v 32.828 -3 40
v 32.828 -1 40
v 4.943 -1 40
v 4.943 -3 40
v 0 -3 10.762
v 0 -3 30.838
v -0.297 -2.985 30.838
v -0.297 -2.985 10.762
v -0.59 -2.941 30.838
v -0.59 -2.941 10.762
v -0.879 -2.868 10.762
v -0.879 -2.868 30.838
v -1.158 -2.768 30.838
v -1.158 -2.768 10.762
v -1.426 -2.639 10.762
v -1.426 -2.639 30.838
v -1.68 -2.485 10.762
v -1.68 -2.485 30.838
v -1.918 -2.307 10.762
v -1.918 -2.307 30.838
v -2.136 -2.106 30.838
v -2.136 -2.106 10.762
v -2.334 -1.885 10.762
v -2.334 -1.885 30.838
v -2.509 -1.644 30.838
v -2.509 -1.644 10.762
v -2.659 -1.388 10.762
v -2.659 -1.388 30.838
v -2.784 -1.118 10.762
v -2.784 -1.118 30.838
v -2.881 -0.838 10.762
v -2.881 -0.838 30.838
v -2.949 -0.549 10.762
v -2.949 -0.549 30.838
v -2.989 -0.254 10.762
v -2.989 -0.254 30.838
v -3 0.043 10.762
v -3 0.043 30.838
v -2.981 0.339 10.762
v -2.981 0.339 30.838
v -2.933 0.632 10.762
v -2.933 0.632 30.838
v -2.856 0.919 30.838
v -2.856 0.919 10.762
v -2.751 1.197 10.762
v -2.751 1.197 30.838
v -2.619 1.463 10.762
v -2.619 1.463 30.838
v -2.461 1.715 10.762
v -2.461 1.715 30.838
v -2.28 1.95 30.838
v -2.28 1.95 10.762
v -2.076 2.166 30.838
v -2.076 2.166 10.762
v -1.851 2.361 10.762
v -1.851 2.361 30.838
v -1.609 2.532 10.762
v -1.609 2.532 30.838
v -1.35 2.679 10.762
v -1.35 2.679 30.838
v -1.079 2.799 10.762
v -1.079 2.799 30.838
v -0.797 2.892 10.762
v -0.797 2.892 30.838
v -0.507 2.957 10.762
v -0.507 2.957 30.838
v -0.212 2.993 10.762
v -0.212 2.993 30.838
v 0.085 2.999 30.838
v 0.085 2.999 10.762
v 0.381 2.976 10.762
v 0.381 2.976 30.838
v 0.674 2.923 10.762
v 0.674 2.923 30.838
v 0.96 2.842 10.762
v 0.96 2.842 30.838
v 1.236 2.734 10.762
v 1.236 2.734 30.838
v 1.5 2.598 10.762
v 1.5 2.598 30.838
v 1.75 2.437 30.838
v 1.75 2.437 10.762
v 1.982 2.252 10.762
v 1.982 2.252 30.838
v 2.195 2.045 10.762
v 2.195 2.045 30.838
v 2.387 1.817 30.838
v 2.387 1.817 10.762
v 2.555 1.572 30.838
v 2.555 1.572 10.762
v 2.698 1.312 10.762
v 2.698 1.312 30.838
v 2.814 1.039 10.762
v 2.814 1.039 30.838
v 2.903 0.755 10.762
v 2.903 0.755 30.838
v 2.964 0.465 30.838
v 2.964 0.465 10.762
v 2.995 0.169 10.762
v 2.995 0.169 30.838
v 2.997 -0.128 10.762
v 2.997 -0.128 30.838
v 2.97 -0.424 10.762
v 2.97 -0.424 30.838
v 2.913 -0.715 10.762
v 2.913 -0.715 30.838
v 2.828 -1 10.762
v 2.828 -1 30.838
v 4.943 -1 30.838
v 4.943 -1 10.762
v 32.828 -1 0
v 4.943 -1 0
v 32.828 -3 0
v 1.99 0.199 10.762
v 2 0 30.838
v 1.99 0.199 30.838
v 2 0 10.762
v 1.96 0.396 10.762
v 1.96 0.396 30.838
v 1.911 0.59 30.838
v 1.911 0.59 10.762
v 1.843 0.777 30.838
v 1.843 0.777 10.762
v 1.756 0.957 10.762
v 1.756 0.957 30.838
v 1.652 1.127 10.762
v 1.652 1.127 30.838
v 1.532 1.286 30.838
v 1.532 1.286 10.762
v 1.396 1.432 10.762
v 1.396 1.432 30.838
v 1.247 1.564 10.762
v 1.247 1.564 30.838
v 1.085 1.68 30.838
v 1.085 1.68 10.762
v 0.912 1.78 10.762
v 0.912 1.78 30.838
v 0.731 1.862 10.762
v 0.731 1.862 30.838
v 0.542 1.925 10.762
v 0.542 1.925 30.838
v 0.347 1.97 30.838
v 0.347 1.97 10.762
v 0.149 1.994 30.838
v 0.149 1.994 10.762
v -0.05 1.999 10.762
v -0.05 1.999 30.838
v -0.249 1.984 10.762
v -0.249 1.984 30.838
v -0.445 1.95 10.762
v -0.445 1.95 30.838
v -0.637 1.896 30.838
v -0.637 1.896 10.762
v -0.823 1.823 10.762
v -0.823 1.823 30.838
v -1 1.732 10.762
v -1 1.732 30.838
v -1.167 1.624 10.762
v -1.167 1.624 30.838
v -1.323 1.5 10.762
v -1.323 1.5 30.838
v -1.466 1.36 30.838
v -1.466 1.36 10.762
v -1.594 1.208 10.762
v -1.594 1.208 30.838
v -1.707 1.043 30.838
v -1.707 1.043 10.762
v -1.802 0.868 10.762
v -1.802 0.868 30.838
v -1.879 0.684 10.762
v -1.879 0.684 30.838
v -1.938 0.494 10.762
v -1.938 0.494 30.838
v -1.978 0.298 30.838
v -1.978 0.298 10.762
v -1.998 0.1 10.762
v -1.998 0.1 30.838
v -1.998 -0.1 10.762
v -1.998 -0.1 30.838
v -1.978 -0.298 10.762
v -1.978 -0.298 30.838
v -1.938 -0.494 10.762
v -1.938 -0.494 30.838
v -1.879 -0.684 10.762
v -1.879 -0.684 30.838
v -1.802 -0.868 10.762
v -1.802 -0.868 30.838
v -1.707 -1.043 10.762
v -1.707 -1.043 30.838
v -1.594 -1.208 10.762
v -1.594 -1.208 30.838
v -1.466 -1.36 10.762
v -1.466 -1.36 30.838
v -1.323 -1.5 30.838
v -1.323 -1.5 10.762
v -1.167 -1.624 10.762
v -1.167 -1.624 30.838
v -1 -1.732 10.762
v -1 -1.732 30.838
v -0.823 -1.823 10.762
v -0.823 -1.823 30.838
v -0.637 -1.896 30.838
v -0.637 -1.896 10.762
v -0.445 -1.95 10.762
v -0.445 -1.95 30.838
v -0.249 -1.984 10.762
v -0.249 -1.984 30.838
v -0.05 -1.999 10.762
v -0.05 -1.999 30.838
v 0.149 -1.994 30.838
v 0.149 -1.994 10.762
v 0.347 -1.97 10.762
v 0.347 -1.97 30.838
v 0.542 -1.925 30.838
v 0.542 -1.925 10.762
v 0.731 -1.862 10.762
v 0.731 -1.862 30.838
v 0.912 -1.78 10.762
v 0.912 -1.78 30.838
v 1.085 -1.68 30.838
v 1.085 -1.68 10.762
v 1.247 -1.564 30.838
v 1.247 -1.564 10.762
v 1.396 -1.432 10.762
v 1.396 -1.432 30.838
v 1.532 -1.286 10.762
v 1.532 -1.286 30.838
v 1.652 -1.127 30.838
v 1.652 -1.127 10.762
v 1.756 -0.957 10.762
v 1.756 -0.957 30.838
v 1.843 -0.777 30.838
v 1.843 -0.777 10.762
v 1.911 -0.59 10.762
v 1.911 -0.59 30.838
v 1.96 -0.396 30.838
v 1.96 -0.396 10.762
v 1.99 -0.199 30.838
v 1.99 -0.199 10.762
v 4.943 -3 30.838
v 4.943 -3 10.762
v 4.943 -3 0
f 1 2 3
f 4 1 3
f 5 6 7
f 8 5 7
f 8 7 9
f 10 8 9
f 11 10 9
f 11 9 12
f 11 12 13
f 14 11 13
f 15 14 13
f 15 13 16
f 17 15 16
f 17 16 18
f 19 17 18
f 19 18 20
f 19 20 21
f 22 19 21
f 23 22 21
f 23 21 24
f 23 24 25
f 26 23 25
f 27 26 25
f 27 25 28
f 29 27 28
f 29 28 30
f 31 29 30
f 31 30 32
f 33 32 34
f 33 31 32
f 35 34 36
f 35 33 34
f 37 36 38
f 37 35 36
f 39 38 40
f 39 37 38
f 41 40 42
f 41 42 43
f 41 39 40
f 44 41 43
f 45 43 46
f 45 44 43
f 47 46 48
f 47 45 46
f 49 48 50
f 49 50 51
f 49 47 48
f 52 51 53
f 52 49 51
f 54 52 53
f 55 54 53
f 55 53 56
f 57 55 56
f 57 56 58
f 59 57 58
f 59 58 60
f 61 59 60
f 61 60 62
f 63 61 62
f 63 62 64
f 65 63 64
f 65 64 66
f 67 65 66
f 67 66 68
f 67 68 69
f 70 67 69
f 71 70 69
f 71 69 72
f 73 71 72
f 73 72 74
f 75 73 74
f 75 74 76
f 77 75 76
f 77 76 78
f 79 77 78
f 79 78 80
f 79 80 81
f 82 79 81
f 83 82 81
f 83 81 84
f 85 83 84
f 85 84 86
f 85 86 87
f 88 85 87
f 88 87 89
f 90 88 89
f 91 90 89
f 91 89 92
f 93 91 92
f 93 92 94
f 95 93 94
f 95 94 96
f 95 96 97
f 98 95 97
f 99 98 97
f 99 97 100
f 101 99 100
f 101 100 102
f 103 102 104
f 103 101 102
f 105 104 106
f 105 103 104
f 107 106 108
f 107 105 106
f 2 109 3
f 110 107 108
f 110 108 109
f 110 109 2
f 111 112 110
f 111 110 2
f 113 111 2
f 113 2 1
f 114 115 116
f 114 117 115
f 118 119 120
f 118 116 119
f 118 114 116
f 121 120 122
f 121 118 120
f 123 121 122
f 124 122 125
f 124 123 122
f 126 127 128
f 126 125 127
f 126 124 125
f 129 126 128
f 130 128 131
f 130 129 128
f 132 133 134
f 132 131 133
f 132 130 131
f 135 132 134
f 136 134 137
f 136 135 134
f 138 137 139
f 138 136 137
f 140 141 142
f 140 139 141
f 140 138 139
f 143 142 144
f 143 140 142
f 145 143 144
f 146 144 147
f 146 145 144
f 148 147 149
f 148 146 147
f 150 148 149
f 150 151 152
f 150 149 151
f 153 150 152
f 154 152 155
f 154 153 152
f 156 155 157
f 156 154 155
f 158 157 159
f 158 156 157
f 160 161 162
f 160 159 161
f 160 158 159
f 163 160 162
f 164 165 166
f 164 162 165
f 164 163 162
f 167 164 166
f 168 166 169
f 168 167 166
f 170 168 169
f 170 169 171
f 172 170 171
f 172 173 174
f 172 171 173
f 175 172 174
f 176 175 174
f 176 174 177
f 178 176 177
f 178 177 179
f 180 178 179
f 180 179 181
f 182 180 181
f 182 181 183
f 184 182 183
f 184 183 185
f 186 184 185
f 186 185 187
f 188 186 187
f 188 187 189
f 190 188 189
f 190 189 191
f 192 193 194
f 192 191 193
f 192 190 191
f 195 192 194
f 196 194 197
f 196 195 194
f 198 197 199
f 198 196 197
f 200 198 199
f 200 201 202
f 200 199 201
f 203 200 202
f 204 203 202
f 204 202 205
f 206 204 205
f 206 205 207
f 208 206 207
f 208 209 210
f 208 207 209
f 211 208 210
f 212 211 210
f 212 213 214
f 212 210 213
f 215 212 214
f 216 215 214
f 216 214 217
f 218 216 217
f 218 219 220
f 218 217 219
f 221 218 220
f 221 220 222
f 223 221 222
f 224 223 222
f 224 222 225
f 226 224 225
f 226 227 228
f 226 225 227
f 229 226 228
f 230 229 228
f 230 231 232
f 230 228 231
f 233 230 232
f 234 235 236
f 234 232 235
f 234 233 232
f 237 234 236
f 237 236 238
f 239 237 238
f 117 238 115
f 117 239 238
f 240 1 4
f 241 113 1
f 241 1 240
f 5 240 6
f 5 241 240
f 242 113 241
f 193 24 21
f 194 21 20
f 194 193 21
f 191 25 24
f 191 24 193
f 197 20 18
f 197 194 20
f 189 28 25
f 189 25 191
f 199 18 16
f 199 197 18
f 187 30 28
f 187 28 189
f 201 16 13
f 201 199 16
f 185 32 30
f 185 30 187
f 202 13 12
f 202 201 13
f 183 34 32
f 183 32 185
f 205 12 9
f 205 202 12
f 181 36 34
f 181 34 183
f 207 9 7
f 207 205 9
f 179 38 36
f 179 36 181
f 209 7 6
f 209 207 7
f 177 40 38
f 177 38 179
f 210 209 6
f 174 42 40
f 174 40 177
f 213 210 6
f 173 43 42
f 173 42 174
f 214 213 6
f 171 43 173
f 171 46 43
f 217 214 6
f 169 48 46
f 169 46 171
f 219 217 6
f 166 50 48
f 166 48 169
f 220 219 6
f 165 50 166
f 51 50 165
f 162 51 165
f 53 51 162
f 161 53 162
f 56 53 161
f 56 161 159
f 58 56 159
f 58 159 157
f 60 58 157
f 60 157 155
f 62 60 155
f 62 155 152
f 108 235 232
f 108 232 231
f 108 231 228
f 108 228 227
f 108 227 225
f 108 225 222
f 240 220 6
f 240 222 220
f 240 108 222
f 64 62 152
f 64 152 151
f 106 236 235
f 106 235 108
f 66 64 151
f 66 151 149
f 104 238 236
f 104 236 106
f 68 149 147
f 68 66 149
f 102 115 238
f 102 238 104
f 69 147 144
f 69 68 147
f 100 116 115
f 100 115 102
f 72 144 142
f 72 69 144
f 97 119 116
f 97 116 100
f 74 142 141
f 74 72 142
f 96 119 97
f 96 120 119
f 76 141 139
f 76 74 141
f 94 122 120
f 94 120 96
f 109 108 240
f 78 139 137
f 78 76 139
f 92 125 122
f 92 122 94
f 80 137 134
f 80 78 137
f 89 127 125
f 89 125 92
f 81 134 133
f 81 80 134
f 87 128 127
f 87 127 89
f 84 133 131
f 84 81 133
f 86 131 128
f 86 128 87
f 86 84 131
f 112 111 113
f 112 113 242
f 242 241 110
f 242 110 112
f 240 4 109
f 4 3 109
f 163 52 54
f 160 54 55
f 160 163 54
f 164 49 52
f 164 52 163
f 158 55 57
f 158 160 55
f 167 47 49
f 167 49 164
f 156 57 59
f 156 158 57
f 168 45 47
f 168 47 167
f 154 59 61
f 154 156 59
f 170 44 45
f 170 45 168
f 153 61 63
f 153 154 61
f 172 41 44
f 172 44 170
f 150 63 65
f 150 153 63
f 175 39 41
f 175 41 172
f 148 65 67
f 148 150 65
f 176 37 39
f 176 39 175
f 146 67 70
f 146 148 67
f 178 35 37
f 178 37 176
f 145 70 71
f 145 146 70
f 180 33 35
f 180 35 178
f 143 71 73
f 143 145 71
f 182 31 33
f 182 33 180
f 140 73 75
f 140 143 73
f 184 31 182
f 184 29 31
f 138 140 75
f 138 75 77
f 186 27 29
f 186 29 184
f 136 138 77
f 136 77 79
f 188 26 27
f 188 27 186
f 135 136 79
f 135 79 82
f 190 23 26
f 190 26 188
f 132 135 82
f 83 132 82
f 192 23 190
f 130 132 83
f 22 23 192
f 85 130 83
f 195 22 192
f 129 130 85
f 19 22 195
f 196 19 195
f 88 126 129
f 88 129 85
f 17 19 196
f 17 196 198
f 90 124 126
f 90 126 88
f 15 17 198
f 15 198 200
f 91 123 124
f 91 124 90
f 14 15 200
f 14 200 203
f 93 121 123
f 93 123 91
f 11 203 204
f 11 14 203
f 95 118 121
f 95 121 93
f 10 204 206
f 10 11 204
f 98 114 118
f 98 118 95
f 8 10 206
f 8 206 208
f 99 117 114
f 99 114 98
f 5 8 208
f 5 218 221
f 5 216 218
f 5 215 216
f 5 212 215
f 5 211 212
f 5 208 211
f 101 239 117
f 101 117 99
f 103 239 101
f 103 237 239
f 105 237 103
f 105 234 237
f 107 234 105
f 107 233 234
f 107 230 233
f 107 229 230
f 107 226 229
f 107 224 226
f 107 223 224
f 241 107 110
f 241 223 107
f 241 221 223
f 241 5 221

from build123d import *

# Parameters (mm, degrees)
SKETCH_1_R          = 2
EXTRUDE_1_DEPTH     = 40
SKETCH_2_W          = 10.776638496
SKETCH_2_H          = 12.262488547
SKETCH_2_H_2        = 11.437792605
CUT_EXTRUDE_2_DEPTH = 20


with BuildPart() as part:
    # Эскиз1 → Вытянуть1 (new body)
    with BuildSketch(Plane.XY):
        with BuildLine():
            Line((2.828427125, -1), (32.828427125, -1))
            Line((32.828427125, -1), (32.828427125, -3))
            Line((32.828427125, -3), (0, -3))
            ThreePointArc((0, -3), (-1.732050808, 2.449489743), (2.828427125, -1))
        make_face()
        Circle(SKETCH_1_R, mode=Mode.SUBTRACT)
    extrude(amount=EXTRUDE_1_DEPTH)

    # Эскиз2 → Вытянуть2 (cut, symmetric)
    with BuildSketch(Plane(origin=(0, 0, 0), x_dir=(1, 0, 0), z_dir=(0, 1, 0))):
        with Locations((-0.445273779, -4.631244274)):
            Rectangle(SKETCH_2_W, SKETCH_2_H)
        with Locations((-0.445273779, -36.556842192)):
            Rectangle(SKETCH_2_W, SKETCH_2_H_2)
    extrude(amount=CUT_EXTRUDE_2_DEPTH, both=True, mode=Mode.SUBTRACT)


solid = part.part
